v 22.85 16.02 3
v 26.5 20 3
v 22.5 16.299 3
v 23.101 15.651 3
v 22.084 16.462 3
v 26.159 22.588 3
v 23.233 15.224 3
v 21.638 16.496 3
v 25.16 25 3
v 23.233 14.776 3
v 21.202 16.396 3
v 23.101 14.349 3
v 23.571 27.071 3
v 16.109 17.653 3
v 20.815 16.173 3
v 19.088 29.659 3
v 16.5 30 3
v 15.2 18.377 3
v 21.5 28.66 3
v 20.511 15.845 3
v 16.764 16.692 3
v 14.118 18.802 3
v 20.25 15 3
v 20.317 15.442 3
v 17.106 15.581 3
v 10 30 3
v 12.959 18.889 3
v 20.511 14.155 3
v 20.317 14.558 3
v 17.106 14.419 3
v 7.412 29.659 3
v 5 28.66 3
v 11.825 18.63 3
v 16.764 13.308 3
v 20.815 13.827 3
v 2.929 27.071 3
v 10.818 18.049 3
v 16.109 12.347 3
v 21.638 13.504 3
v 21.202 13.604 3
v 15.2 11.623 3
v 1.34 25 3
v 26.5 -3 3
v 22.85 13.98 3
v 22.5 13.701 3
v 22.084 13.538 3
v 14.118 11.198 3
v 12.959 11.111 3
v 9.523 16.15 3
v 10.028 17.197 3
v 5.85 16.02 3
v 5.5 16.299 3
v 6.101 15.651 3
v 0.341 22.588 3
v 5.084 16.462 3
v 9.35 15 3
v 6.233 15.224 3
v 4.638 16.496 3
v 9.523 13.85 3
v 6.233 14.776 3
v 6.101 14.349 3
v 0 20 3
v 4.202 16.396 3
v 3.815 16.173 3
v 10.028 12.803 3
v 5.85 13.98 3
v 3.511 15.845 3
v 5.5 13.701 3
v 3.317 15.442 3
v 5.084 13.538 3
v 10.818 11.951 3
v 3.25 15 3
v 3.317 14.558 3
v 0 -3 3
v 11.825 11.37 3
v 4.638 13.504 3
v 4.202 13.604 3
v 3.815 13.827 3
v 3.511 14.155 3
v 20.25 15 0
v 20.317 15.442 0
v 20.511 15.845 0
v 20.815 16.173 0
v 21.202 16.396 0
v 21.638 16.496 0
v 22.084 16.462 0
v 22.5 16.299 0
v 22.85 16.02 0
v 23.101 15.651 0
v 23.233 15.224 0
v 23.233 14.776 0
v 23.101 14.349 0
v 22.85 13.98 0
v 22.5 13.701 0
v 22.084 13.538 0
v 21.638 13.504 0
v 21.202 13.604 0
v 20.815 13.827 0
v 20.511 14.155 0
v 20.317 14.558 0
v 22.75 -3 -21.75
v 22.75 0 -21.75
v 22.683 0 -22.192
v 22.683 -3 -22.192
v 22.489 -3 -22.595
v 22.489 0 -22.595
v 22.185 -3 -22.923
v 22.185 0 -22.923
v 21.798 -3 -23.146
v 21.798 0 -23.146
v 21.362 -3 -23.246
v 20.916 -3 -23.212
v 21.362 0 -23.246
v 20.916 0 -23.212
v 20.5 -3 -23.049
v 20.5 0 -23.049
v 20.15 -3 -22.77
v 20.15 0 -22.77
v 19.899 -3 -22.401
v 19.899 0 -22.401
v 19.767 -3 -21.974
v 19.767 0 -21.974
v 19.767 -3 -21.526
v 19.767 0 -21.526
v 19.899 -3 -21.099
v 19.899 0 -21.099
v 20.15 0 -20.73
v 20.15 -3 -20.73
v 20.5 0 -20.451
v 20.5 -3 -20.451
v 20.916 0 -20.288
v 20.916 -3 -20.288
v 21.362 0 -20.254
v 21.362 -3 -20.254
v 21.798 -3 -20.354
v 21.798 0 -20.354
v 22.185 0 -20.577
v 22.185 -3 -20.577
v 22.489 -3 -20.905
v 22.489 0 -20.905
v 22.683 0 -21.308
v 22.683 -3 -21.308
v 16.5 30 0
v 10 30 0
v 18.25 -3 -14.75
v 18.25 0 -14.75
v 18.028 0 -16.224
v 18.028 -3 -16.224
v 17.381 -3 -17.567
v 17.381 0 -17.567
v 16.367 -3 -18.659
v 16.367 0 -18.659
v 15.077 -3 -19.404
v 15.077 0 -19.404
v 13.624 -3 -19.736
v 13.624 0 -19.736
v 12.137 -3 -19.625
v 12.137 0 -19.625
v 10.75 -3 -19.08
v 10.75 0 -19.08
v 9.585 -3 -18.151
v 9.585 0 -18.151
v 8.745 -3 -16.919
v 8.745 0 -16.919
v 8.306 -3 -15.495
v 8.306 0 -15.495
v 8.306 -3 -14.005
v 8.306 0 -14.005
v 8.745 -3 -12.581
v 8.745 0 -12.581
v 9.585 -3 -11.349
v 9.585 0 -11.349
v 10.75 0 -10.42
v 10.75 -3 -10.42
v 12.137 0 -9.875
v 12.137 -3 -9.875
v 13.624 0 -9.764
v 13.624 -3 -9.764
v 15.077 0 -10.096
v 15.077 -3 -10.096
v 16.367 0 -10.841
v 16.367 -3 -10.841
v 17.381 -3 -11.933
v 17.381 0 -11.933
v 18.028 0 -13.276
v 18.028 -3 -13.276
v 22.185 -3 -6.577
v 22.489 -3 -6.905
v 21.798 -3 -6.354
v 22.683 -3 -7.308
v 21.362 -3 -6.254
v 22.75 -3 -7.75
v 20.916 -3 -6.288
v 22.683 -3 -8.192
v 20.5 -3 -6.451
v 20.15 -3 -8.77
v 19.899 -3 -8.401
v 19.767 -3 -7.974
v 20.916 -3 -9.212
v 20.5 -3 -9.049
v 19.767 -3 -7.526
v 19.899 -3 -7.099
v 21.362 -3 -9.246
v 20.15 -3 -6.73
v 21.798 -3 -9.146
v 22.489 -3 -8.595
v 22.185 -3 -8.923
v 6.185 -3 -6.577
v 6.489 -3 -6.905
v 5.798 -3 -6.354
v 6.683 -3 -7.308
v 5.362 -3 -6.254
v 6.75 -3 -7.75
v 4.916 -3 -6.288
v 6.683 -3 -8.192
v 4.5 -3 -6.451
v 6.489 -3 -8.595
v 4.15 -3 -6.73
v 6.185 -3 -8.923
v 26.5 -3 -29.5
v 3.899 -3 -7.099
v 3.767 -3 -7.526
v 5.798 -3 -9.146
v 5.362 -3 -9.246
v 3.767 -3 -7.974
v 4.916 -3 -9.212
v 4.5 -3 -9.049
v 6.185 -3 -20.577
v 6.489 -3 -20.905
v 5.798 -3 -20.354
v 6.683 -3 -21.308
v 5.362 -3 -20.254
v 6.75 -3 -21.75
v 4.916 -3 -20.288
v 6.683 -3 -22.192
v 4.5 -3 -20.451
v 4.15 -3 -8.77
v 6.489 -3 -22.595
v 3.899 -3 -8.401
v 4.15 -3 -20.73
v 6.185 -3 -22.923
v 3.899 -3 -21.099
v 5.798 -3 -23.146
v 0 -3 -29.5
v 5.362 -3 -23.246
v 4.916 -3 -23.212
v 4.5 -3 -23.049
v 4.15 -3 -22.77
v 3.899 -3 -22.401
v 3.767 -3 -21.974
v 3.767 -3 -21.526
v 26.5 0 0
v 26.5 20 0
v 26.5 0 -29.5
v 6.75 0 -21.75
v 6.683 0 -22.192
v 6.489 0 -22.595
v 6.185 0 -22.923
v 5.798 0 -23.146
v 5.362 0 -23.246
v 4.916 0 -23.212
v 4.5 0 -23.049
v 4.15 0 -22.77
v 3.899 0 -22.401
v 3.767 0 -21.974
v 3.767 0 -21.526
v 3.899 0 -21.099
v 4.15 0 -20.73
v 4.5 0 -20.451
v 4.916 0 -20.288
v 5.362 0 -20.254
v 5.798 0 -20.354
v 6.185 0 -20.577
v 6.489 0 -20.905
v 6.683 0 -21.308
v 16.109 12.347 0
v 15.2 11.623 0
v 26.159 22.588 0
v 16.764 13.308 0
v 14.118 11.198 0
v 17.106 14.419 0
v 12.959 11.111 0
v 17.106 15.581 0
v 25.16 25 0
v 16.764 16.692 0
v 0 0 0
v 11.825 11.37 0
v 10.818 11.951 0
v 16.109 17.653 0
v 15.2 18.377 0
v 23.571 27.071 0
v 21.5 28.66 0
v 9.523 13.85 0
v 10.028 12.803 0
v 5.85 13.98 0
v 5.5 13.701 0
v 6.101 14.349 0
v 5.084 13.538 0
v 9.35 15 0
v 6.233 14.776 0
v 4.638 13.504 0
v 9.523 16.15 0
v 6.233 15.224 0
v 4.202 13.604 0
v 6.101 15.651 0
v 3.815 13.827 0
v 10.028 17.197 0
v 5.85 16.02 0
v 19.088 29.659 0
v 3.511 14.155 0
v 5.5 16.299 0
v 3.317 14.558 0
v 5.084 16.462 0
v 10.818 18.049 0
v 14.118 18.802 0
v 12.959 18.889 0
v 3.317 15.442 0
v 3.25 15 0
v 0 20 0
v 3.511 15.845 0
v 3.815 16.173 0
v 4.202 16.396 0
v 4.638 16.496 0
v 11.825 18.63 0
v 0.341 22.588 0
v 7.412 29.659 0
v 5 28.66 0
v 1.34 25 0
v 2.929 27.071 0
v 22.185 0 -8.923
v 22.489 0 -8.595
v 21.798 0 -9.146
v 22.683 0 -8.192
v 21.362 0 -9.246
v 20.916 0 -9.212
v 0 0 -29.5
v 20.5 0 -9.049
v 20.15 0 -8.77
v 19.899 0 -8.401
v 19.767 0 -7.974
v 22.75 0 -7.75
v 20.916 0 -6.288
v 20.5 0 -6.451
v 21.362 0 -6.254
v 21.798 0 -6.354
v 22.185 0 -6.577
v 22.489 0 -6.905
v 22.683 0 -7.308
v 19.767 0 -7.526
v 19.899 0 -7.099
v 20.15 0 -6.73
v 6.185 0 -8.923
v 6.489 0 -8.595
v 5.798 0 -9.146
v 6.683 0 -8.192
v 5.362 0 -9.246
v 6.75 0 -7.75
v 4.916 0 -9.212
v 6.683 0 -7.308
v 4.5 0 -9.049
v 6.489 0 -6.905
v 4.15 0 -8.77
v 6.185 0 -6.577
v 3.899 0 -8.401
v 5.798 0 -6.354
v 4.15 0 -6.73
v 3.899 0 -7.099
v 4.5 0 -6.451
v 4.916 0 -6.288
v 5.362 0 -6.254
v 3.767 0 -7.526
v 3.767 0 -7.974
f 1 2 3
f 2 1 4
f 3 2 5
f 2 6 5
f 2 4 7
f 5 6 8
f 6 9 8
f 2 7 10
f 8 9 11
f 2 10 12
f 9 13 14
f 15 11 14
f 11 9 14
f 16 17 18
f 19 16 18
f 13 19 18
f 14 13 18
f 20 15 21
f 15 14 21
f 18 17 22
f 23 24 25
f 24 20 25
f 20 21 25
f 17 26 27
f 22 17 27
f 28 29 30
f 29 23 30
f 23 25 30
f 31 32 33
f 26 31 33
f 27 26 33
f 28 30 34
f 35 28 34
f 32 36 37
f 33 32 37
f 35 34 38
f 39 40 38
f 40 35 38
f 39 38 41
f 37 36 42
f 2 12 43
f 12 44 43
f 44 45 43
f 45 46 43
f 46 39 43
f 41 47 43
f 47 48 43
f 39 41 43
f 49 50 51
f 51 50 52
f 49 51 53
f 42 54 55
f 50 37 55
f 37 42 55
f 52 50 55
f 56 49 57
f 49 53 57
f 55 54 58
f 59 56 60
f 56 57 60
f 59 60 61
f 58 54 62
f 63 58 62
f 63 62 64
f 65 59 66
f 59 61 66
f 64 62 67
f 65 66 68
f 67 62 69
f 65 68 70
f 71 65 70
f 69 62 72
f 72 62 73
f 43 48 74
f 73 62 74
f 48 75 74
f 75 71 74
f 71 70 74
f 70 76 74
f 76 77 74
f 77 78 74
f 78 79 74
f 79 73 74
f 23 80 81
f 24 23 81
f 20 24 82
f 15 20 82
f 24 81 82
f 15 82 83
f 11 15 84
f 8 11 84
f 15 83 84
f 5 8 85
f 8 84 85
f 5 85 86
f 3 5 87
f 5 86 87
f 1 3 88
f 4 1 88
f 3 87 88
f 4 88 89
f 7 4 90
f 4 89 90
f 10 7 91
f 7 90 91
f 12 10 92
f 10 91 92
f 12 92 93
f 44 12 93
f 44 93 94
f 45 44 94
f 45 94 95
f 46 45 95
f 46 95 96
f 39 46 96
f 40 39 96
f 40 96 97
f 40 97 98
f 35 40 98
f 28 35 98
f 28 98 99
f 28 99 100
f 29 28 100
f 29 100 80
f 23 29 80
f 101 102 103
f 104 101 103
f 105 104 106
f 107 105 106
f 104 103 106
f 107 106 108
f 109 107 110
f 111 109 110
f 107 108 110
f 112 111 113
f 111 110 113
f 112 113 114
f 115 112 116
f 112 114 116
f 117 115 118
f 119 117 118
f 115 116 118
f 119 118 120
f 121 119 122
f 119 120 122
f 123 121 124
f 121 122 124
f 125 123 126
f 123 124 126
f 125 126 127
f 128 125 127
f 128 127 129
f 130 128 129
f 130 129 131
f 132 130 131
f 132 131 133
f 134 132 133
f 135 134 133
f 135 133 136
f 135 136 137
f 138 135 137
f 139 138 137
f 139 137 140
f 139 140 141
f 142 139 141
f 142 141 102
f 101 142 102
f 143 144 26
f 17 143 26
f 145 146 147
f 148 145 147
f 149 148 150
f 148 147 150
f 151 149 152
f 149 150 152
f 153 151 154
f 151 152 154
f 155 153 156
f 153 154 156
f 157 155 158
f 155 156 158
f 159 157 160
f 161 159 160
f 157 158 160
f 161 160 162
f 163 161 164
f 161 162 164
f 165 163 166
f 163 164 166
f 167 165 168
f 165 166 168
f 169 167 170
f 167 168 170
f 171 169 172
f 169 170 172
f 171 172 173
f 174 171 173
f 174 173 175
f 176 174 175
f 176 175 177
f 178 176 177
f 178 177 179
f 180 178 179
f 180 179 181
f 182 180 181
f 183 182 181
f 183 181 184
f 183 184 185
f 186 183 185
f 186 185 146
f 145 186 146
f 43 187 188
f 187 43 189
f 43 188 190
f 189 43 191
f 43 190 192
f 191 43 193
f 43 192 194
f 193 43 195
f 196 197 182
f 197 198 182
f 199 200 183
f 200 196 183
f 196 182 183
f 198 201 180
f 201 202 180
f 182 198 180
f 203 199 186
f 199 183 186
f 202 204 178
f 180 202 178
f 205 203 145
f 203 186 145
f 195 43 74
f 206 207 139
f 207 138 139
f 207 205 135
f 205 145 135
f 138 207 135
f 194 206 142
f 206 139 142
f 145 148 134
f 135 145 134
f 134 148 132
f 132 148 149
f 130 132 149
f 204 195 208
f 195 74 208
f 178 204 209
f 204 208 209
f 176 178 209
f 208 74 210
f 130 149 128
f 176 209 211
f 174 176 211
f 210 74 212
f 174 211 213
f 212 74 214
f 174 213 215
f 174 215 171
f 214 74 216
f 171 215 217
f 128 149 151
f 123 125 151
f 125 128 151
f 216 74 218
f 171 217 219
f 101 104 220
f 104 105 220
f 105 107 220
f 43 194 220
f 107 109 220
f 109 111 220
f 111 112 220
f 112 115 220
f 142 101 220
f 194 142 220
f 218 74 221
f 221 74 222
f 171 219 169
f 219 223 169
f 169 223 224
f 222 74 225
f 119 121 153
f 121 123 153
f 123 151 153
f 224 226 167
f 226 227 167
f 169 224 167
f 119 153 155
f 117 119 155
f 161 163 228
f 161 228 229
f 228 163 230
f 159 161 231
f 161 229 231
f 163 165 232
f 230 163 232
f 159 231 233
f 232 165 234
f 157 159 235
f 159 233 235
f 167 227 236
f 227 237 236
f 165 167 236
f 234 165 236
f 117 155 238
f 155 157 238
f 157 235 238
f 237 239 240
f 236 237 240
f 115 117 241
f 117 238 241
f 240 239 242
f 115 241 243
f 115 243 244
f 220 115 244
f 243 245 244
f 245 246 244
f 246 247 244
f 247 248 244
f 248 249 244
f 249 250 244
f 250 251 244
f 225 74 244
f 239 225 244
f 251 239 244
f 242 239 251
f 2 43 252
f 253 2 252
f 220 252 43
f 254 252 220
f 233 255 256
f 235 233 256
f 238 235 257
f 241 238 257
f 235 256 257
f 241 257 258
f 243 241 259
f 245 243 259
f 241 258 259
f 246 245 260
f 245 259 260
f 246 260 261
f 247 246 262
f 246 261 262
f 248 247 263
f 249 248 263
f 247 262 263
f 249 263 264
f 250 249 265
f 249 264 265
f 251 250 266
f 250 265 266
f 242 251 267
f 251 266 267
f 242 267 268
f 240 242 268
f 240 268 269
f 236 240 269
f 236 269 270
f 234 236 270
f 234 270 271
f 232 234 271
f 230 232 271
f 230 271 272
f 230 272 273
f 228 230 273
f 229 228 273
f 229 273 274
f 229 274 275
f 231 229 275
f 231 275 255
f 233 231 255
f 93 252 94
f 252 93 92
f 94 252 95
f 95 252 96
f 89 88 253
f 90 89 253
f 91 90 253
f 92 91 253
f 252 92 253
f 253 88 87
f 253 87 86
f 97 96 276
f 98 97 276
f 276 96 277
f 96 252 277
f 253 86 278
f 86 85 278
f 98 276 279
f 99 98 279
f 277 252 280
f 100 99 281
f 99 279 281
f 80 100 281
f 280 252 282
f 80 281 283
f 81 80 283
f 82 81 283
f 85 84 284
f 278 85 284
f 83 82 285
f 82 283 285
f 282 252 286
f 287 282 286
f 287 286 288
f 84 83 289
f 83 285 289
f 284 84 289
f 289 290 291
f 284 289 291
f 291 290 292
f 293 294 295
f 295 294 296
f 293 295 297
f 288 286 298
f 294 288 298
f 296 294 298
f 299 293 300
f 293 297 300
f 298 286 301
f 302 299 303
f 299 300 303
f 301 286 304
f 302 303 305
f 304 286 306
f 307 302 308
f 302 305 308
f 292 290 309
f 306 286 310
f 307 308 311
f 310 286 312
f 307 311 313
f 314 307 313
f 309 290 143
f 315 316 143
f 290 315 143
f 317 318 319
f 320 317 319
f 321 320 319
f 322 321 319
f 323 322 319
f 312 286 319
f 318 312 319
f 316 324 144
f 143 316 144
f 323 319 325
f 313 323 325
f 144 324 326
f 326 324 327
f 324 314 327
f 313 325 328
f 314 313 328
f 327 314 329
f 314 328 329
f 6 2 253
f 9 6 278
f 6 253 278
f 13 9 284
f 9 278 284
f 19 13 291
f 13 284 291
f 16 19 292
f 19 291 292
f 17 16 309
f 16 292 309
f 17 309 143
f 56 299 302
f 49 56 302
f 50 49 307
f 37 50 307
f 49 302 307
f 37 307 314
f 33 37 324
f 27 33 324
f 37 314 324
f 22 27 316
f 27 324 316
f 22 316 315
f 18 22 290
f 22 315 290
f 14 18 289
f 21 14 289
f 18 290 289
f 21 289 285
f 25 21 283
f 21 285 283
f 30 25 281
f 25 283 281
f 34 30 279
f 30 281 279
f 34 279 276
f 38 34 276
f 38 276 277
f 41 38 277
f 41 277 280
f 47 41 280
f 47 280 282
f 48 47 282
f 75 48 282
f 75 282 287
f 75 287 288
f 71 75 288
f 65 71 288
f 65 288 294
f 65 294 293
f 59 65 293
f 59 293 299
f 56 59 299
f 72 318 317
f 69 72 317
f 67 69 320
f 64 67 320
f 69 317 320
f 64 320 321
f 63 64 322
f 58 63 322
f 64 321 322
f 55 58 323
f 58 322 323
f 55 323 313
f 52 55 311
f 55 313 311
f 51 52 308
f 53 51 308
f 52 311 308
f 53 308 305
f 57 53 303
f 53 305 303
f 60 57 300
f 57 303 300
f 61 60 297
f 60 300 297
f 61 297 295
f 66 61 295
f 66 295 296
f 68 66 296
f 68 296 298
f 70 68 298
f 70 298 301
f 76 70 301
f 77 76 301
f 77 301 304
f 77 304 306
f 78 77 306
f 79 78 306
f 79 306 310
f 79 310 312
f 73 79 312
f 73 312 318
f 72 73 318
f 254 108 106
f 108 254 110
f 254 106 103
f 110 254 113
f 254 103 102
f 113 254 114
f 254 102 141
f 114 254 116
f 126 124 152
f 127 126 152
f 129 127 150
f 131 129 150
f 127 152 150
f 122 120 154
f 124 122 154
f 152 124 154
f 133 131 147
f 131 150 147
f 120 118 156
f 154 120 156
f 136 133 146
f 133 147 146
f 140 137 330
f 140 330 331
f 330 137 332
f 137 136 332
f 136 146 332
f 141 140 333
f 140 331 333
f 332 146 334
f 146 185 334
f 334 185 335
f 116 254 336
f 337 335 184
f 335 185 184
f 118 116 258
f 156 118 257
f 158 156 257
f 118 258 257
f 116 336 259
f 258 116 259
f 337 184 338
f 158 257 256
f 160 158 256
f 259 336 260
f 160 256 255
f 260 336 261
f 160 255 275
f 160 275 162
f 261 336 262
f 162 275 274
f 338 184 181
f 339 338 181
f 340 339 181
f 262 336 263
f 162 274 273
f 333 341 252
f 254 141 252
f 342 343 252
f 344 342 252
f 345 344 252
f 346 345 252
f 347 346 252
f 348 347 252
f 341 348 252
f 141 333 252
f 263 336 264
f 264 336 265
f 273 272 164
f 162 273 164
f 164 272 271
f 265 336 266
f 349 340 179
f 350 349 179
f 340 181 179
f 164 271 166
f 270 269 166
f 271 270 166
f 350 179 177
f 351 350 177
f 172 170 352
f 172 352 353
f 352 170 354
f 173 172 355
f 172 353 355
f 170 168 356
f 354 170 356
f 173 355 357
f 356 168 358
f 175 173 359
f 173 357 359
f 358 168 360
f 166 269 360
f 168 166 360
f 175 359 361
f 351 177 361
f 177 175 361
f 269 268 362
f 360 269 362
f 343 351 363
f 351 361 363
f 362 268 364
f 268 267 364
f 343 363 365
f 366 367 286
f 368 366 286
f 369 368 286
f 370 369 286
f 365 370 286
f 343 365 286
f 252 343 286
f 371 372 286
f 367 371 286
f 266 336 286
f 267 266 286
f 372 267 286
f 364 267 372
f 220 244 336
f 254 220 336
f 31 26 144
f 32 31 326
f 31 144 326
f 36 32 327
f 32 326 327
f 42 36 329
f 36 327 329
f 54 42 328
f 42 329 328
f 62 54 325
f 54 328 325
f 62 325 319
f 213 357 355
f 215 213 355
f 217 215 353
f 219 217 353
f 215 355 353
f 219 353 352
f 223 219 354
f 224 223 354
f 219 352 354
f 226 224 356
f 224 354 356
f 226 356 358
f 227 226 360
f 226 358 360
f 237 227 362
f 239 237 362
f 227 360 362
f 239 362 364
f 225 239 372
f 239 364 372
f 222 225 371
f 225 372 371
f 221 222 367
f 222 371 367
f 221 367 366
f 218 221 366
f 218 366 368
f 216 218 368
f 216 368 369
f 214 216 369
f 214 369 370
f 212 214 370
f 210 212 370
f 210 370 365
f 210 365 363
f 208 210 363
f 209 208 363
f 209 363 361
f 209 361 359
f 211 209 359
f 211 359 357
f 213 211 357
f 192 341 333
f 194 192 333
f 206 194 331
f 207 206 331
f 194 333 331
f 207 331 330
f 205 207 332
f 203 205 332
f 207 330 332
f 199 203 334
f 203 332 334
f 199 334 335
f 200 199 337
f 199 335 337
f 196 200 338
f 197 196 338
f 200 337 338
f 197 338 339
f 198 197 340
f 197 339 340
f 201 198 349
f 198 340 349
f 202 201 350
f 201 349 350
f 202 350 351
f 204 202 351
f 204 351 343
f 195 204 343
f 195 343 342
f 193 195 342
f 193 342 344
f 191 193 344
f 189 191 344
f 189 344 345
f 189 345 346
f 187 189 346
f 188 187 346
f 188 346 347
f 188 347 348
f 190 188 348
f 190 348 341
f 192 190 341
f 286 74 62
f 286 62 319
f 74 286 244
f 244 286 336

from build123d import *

# Parameters (mm, degrees)
BOSS_EXTRUDE1_DEPTH = 26.5
SKETCH2_R           = 3.9
SKETCH2_R_2         = 1.5
CUT_EXTRUDE1_DEPTH  = 4
SKETCH3_R           = 5
SKETCH3_R_2         = 1.5
CUT_EXTRUDE2_DEPTH  = 4


with BuildPart() as part:
    # Sketch1 → Boss-Extrude1 (new body)
    with BuildSketch(Plane(origin=(0, 0, 0), x_dir=(0, 0, -1), z_dir=(1, 0, 0))):
        Polygon((-3, -3), (29.5, -3), (29.5, 0), (0, 0), (0, 30), (-3, 30), align=None)
    extrude(amount=BOSS_EXTRUDE1_DEPTH)

    # Sketch2 → Cut-Extrude1 (cut, through all)
    with BuildSketch(Plane(origin=(0, 0, 0), x_dir=(-1, 0, 0), z_dir=(0, 0, -1))):
        with Locations((-13.25, 15)):
            Circle(SKETCH2_R)
        with Locations((-4.75, 15)):
            Circle(SKETCH2_R_2)
        with Locations((-21.75, 15)):
            Circle(SKETCH2_R_2)
        with BuildLine():
            ThreePointArc((-26.5, 20), (-23.571067812, 27.071067812), (-16.5, 30))
            Line((-16.5, 30), (-26.5, 30))
            Line((-26.5, 30), (-26.5, 20))
        make_face()
        with BuildLine():
            Line((0, 30), (-10, 30))
            ThreePointArc((-10, 30), (-2.928932188, 27.071067812), (0, 20))
            Line((0, 20), (0, 30))
        make_face()
    extrude(amount=-CUT_EXTRUDE1_DEPTH, mode=Mode.SUBTRACT)

    # Sketch3 → Cut-Extrude2 (cut, through all)
    with BuildSketch(Plane(origin=(0, 0, 0), x_dir=(1, 0, 0), z_dir=(0, 1, 0))):
        with Locations((13.25, 14.75)):
            Circle(SKETCH3_R)
        with Locations((21.25, 21.75)):
            Circle(SKETCH3_R_2)
        with Locations((21.25, 7.75)):
            Circle(SKETCH3_R_2)
        with Locations((5.25, 21.75)):
            Circle(SKETCH3_R_2)
        with Locations((5.25, 7.75)):
            Circle(SKETCH3_R_2)
    extrude(amount=-CUT_EXTRUDE2_DEPTH, mode=Mode.SUBTRACT)


solid = part.part
